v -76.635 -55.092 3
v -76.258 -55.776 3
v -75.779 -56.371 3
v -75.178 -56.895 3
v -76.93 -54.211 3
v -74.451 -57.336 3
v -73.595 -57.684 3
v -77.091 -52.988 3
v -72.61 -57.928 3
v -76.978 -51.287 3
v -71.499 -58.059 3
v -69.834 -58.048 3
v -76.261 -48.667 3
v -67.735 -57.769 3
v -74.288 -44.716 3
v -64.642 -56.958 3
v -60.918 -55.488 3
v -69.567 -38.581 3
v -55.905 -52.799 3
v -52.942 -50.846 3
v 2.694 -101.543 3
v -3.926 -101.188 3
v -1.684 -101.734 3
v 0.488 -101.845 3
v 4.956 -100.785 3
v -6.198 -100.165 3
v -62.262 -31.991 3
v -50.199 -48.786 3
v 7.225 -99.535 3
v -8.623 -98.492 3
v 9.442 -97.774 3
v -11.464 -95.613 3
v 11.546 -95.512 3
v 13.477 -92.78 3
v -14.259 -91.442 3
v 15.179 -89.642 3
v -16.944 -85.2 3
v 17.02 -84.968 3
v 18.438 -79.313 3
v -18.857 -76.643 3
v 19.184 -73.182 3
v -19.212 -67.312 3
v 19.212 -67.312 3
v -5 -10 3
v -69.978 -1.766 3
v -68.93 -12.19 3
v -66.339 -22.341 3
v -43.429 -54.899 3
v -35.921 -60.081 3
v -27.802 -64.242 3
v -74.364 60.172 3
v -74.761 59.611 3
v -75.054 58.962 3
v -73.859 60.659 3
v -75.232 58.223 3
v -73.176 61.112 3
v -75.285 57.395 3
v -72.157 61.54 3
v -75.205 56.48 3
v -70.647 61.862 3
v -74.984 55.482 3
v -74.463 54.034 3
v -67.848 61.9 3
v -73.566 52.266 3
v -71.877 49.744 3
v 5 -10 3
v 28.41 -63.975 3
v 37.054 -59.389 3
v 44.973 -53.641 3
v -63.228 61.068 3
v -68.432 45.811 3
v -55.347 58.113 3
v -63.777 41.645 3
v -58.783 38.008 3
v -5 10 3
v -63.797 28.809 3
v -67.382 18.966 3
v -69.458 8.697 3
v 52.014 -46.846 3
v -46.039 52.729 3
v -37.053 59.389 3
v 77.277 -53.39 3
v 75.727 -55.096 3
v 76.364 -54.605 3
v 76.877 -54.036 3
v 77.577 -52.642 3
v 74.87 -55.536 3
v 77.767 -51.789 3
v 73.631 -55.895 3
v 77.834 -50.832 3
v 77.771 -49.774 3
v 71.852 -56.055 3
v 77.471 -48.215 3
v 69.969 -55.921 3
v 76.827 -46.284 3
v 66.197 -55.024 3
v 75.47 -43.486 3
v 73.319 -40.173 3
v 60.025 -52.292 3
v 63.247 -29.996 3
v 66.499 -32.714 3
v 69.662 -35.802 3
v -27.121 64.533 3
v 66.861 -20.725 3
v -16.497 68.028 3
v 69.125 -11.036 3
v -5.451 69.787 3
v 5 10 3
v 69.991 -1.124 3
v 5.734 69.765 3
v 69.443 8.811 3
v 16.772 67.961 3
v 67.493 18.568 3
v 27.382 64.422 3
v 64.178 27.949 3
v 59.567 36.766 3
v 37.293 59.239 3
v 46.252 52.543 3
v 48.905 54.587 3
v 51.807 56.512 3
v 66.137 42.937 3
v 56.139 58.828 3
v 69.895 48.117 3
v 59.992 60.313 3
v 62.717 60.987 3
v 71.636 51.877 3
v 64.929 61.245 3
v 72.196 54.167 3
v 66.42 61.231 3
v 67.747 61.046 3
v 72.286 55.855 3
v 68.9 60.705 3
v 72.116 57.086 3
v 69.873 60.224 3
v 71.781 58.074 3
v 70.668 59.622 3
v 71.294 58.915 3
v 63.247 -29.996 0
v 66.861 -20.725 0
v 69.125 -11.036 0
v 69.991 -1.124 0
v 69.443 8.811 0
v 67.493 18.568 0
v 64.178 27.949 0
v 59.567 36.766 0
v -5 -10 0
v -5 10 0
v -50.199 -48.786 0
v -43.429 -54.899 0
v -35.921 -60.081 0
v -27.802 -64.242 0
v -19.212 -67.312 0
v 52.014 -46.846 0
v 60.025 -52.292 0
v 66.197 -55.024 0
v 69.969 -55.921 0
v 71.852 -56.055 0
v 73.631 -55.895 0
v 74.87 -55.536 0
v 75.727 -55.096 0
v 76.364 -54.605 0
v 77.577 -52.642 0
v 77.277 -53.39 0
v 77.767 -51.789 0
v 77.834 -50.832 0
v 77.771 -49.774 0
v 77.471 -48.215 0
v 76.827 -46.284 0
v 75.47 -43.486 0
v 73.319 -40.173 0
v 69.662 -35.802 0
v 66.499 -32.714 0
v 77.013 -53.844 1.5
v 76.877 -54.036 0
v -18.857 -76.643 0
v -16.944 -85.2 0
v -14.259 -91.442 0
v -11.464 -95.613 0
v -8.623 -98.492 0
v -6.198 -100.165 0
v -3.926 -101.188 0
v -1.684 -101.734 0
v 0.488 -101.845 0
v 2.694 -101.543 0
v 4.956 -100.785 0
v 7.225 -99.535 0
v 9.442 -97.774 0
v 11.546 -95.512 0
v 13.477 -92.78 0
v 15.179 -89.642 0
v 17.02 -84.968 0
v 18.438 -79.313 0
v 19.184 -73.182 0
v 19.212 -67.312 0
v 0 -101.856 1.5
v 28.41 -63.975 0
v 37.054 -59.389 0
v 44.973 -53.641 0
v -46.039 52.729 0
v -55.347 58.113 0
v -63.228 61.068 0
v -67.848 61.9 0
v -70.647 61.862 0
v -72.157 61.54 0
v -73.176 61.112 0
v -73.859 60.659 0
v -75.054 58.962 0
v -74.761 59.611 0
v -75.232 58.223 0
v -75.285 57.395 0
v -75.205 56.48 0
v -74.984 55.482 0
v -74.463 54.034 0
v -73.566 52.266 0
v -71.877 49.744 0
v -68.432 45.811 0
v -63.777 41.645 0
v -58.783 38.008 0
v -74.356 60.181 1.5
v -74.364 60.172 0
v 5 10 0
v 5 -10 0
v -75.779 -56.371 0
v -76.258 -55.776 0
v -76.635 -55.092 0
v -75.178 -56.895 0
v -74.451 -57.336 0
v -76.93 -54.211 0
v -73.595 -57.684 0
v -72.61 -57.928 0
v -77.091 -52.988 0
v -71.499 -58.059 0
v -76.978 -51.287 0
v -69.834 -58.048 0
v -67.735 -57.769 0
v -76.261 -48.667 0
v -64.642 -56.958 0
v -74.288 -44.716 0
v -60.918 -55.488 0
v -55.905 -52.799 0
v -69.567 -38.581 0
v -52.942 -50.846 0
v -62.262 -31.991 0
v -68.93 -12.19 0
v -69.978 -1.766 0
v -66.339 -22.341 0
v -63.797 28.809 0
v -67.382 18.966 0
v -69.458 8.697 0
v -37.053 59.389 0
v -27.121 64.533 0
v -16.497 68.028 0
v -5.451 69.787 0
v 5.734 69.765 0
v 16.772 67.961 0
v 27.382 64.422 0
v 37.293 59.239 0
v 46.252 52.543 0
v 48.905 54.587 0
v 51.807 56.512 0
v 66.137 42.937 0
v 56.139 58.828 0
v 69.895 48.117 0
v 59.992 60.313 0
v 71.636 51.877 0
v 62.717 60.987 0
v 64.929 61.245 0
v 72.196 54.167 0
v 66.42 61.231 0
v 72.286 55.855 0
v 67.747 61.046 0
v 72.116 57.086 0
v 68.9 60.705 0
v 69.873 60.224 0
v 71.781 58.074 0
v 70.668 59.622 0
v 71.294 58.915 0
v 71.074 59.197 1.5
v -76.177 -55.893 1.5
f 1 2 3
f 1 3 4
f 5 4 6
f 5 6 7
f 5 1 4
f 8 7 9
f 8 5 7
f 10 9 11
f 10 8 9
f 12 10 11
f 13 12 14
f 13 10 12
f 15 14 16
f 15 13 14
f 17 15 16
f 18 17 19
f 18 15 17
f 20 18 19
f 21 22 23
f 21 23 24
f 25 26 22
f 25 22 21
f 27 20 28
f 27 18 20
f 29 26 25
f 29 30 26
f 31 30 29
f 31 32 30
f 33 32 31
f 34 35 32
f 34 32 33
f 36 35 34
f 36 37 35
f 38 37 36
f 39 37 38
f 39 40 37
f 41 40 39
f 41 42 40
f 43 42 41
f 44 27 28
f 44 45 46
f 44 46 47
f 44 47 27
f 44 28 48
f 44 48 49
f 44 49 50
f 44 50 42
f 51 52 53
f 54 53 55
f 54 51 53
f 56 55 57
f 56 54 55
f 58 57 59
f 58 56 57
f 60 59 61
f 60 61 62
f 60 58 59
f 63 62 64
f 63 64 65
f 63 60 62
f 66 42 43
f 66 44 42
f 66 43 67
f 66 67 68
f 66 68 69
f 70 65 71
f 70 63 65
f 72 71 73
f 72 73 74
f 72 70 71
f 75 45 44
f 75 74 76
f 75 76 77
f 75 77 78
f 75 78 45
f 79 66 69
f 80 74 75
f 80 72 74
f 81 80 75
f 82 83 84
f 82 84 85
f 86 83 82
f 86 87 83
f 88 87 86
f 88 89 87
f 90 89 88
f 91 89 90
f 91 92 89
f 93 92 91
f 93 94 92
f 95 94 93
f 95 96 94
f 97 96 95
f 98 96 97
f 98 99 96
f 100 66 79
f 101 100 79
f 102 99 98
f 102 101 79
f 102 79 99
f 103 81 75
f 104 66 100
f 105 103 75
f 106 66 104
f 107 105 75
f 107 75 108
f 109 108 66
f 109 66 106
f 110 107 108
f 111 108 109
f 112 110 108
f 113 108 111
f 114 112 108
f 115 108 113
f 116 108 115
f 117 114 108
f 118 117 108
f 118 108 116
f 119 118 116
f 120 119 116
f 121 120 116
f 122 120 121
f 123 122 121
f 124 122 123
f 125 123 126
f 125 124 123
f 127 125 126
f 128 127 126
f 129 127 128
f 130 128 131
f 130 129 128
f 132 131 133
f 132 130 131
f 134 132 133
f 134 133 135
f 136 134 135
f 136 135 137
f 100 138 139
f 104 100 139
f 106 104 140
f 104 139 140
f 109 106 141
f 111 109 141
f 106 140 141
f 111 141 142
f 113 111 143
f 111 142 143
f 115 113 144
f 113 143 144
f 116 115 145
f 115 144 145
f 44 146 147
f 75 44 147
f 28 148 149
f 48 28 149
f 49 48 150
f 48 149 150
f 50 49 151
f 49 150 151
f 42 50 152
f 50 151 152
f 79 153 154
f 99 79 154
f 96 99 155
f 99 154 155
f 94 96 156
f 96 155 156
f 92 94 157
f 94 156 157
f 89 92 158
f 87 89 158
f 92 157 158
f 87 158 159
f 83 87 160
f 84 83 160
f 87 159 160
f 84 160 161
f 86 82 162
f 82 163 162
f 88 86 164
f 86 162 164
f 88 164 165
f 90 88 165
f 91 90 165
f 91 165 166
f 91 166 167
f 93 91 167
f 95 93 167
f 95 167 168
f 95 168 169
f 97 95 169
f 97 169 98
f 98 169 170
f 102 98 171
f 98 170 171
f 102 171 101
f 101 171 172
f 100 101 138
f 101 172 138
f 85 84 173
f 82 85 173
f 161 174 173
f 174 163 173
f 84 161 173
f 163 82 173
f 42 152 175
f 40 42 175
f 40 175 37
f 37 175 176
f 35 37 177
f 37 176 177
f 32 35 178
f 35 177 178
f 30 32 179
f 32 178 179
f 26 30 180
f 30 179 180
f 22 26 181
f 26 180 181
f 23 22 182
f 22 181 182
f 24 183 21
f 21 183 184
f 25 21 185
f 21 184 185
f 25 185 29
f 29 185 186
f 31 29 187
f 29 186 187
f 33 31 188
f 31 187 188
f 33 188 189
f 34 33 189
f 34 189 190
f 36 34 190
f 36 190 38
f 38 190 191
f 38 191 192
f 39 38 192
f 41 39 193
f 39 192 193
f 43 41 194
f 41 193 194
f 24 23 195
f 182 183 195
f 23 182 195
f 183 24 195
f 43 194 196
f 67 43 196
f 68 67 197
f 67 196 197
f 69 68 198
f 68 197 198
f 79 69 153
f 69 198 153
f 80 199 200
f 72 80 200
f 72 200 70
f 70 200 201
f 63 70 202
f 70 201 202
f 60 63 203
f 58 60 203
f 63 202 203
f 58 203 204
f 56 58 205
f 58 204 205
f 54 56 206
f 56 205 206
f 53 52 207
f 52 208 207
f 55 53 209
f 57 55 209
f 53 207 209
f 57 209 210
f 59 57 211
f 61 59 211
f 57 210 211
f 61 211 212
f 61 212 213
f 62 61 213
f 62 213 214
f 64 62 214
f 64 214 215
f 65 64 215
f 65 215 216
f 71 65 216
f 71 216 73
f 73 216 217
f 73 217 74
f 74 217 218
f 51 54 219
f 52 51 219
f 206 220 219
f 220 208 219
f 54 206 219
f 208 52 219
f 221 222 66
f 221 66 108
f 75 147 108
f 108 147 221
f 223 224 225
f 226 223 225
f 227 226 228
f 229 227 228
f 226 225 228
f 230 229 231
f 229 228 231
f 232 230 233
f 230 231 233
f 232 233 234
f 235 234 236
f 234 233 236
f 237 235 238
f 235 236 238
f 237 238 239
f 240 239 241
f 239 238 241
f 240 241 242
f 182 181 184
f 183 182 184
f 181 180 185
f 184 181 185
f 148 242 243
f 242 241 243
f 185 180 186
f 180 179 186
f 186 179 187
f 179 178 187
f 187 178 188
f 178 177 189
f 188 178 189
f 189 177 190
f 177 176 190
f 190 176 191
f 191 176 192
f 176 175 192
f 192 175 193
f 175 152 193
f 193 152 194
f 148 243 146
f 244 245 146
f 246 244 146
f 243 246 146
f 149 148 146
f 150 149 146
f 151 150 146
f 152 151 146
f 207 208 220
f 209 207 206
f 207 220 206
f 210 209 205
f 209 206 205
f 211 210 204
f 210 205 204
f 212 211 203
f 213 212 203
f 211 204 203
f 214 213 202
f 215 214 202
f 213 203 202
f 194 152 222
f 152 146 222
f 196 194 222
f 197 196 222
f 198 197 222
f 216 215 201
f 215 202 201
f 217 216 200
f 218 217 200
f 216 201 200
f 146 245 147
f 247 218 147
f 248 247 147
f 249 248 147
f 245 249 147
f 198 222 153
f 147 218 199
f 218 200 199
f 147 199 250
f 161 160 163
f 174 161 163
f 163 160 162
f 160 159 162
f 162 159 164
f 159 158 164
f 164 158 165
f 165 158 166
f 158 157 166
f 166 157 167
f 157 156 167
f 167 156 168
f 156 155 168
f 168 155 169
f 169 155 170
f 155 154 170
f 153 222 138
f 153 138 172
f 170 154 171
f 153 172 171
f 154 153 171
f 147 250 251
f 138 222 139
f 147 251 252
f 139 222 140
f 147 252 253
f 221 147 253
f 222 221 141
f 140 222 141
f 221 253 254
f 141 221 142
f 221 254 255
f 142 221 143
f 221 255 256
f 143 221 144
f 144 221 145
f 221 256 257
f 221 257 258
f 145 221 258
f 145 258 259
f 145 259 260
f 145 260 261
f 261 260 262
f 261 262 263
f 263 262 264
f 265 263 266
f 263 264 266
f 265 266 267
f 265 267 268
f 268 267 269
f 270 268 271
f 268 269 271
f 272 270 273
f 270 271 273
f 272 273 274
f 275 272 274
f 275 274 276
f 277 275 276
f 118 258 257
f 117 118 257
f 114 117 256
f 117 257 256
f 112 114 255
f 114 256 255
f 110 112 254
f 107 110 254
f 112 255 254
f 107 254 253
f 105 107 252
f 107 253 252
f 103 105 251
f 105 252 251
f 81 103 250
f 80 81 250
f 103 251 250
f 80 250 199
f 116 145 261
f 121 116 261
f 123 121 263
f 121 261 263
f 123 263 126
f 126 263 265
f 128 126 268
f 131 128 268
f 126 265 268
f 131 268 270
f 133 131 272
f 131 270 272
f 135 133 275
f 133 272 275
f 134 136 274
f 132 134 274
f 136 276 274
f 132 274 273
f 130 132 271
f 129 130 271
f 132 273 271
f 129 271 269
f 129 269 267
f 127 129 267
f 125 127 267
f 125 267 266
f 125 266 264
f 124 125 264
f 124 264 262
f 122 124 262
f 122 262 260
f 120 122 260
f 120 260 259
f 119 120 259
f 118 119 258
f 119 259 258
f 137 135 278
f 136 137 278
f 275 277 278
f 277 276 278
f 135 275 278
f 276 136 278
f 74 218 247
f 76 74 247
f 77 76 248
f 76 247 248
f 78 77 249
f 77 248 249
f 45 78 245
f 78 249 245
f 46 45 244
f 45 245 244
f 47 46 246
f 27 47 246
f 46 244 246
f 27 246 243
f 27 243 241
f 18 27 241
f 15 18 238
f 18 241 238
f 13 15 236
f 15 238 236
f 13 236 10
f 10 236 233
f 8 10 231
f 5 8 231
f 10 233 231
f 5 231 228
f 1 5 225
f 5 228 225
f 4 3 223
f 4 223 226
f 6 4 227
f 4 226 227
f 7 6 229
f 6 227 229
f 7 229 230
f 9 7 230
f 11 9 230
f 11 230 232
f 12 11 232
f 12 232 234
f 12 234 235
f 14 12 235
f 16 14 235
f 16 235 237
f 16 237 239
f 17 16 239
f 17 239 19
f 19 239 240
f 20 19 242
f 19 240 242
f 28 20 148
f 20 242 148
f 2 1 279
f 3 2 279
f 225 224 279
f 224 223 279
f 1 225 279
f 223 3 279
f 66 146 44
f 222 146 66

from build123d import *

# Parameters (mm, degrees)
F0_W     = 10
F0_H     = 20
F1_DEPTH = 3


with BuildPart() as f1:
    # F0 (on Top) → F1 (new body)
    with BuildSketch(Plane.XY):
        with BuildLine():
            add(Edge.make_bspline(
                [(-46.0391518575, 52.7294651618), (-67.8101614664, 67.7423418378), (-74.3558205184, 60.1806463757), (-80.9014795704, 52.6189509136), (-58.7826777446, 38.0078517831)],
                knots=[4.633386757, 4.633386757, 4.633386757, 6.2307528408, 6.2307528408, 7.8281189246, 7.8281189246, 7.8281189246], degree=2, weights=[1, 0.6976508328, 1, 0.6976508328, 1]))
            ThreePointArc((-58.7826777446, 38.0078517831), (-69.9136782628, 3.4752829769), (-62.262191037, -31.9909294531))
            add(Edge.make_bspline(
                [(-62.262191037, -31.9909294531), (-82.4038068313, -47.223712019), (-76.1770681531, -55.8929235783), (-69.9503294749, -64.5621351376), (-50.1993071337, -48.7855466639)],
                knots=[4.6615649831, 4.6615649831, 4.6615649831, 6.2637306623, 6.2637306623, 7.8658963415, 7.8658963415, 7.8658963415], degree=2, weights=[1, 0.6959295194, 1, 0.6959295194, 1]))
            ThreePointArc((-50.1993071337, -48.7855466639), (-35.9205044192, -60.0809234472), (-19.2117914208, -67.3120128239))
            add(Edge.make_bspline(
                [(-19.2117914208, -67.3120128239), (-20.9822782655, -101.8556983769), (0, -101.8556983769), (20.9822782655, -101.8556983769), (19.2117914208, -67.3120128239)],
                knots=[1.4863157685, 1.4863157685, 1.4863157685, 3.1415926536, 3.1415926536, 4.7968695387, 4.7968695387, 4.7968695387], degree=2, weights=[1, 0.6766165439, 1, 0.6766165439, 1]))
            ThreePointArc((19.2117914208, -67.3120128239), (37.0539589354, -59.3885858328), (52.0140571456, -46.8458947961))
            ThreePointArc((52.0140571456, -46.8458947961), (58.2433416237, -38.8292822044), (63.2474944967, -29.9959070522))
            ThreePointArc((63.2474944967, -29.9959070522), (69.8938774959, 3.8530362812), (59.5670976046, 36.7663009148))
            add(Edge.make_bspline(
                [(59.5670976046, 36.7663009148), (77.9654601676, 51.0313716272), (71.0735907958, 59.1973269767), (64.1817214241, 67.3632823262), (46.2522308571, 52.5426601985)],
                knots=[4.6933916319, 4.6933916319, 4.6933916319, 6.298210837, 6.298210837, 7.9030300421, 7.9030300421, 7.9030300421], degree=2, weights=[1, 0.6949761454, 1, 0.6949761454, 1]))
            ThreePointArc((46.2522308571, 52.5426601985), (0.1416851742, 69.9998566092), (-46.0391518575, 52.7294651618))
        make_face()
        Rectangle(F0_W, F0_H, mode=Mode.SUBTRACT)
        with BuildLine():
            add(Edge.make_bspline(
                [(52.0140571456, -46.8458947961), (71.2177415421, -62.5366709433), (77.0126162643, -53.8444456703), (82.8074909864, -45.1522203974), (63.2474944967, -29.9959070522)],
                knots=[4.7246242101, 4.7246242101, 4.7246242101, 6.326169109, 6.326169109, 7.9277140079, 7.9277140079, 7.9277140079], degree=2, weights=[1, 0.6961523802, 1, 0.6961523802, 1]))
            ThreePointArc((63.2474944967, -29.9959070522), (58.2433416237, -38.8292822044), (52.0140571456, -46.8458947961))
        make_face()
    extrude(amount=F1_DEPTH)


solid = f1.part
